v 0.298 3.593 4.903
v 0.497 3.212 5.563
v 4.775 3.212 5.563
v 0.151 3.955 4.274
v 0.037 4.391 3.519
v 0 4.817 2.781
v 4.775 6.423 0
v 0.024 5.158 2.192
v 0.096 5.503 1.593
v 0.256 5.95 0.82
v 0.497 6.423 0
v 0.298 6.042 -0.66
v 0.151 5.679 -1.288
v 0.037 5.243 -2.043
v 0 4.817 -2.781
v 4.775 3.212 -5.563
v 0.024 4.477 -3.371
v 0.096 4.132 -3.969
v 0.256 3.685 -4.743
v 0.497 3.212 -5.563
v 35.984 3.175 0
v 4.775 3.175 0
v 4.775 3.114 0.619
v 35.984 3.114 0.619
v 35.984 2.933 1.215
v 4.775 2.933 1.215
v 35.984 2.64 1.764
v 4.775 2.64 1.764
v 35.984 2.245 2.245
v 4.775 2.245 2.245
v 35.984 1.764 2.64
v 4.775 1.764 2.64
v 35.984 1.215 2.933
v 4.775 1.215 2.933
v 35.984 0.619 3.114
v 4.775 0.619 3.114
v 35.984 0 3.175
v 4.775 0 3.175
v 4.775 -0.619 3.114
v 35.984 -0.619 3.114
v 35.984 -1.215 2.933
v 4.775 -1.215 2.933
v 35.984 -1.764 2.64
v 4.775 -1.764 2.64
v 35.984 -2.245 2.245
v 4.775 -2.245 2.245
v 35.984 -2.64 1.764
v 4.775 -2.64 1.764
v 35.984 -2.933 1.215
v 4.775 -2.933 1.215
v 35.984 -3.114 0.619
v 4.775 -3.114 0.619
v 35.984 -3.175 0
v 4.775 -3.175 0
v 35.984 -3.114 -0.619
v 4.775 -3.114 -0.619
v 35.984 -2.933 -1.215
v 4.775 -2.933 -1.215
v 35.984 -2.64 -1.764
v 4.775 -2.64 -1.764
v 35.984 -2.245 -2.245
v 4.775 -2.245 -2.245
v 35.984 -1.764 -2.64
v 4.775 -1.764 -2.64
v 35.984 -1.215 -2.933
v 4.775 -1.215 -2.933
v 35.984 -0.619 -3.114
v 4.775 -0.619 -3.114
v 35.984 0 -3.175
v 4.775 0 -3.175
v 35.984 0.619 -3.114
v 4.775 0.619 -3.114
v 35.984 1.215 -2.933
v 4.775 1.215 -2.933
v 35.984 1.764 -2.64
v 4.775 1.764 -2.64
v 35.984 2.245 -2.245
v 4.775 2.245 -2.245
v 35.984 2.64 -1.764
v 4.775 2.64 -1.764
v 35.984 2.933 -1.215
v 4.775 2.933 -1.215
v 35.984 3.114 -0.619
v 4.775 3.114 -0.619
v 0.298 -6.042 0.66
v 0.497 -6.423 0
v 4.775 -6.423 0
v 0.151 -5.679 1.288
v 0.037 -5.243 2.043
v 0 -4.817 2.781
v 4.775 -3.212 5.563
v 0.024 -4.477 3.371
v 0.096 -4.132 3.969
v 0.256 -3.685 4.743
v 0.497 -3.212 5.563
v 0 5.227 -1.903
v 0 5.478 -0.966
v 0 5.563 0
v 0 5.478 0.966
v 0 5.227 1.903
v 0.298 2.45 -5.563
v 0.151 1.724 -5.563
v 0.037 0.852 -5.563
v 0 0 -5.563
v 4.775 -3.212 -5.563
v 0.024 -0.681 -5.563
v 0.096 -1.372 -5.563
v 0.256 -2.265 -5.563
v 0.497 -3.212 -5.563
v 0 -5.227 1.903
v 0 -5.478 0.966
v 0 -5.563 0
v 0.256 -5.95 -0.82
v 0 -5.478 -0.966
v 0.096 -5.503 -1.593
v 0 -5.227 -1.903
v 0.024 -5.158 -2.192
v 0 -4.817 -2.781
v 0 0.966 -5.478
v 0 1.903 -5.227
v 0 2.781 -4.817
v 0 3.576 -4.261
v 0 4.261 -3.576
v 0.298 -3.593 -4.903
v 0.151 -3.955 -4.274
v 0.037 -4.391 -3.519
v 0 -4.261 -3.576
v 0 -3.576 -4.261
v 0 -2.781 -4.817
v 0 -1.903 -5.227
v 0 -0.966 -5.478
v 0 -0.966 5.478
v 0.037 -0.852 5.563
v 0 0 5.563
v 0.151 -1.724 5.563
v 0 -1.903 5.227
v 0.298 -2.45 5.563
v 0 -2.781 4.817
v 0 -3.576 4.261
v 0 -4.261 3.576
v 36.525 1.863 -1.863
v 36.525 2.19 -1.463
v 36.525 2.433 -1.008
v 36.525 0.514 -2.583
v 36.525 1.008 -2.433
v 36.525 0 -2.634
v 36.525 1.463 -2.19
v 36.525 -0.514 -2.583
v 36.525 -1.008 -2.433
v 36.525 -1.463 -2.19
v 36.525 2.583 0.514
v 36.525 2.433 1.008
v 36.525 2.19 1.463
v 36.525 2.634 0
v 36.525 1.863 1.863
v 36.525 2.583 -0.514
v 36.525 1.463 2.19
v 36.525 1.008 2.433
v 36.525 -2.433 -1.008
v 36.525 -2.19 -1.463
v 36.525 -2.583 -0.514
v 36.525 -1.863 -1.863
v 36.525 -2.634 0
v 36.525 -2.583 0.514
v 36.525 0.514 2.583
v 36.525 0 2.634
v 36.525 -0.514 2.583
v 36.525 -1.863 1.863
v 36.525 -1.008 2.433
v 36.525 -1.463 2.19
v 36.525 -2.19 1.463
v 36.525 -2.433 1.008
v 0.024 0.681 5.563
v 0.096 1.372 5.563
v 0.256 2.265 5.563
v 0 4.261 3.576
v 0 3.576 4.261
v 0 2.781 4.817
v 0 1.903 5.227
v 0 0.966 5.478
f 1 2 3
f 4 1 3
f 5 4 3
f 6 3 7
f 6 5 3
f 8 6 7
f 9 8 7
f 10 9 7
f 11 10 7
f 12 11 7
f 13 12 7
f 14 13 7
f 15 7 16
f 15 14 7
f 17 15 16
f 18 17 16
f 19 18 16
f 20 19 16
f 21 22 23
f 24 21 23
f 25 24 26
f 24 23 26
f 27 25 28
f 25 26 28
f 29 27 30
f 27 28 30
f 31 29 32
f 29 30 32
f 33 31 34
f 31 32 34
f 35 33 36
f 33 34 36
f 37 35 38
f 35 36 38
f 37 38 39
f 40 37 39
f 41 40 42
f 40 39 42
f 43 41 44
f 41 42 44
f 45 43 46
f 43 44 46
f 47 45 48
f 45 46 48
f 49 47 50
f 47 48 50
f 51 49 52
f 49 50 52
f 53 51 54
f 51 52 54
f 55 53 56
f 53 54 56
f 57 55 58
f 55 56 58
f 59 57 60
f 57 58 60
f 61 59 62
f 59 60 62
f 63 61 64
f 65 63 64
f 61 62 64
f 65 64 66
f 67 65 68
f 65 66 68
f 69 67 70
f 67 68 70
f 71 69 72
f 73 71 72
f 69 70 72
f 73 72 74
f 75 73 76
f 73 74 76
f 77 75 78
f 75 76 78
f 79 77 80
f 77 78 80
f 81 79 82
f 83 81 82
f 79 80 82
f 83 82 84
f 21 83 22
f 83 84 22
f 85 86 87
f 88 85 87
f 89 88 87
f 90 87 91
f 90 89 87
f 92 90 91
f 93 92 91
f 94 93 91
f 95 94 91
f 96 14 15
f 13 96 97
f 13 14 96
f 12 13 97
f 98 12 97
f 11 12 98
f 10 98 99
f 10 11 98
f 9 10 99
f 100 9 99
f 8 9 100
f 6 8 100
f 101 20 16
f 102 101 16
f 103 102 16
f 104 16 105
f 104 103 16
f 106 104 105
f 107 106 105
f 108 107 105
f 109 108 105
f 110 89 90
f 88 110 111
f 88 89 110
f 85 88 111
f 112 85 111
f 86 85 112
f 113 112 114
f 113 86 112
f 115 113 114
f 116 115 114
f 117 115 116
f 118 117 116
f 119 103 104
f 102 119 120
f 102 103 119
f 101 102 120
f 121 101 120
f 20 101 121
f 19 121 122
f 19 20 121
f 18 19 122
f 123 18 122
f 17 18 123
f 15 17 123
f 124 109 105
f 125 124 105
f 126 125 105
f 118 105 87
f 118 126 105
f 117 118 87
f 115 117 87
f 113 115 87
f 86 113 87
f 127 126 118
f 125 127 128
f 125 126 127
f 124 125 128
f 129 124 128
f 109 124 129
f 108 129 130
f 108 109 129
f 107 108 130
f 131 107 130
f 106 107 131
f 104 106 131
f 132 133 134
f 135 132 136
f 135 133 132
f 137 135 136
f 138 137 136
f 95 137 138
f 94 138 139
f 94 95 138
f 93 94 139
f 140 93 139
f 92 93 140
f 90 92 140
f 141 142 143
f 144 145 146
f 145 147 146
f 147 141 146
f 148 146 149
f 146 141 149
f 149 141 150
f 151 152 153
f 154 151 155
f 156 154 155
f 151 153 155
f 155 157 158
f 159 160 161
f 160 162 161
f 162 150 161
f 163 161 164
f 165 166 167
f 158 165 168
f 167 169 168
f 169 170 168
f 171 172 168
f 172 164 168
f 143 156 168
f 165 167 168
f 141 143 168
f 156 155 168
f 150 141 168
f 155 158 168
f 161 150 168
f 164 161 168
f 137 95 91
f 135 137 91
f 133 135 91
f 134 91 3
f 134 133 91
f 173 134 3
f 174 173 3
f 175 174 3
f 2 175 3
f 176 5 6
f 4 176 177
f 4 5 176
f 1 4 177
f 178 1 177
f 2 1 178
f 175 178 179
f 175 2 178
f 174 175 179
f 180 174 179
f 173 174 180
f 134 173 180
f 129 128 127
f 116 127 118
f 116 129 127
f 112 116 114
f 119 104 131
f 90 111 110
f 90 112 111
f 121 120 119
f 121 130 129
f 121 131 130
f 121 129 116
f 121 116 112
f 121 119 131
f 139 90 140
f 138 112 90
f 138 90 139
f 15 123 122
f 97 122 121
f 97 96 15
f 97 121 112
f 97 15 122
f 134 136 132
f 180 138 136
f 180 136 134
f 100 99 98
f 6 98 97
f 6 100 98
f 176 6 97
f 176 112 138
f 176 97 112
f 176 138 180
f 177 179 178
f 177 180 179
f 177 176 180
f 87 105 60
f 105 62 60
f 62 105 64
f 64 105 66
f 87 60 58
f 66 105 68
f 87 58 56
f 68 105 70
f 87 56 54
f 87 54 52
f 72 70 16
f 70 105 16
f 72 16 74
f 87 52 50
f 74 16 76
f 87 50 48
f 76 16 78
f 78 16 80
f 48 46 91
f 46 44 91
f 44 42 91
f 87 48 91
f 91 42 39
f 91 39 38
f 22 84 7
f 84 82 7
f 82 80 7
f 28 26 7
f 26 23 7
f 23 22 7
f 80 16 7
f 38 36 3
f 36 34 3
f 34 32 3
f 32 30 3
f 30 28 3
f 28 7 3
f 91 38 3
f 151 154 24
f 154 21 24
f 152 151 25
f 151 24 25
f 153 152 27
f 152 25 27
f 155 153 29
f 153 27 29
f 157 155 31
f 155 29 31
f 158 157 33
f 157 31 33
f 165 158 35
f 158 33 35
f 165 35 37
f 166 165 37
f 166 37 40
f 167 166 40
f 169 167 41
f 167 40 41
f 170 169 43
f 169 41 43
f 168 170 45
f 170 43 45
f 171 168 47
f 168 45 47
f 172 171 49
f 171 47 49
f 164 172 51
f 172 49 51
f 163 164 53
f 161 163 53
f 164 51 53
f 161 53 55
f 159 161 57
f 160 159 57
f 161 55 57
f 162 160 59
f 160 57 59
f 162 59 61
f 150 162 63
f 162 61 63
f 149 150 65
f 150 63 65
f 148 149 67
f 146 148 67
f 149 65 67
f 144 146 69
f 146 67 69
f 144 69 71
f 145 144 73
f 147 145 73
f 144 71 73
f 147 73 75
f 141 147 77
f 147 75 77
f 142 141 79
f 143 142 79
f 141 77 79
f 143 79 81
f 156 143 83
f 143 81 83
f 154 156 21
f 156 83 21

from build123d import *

# Parameters (mm, degrees)
BASEHEAD_DEPTH = 4.7752


with BuildPart() as part:
    # Sketch1 → BaseHead (new body)
    with BuildSketch(Plane(origin=(0, 0, 0), x_dir=(0, 0, -1), z_dir=(1, 0, 0))):
        Polygon((5.5626, 3.211568607), (5.5626, -3.211568607), (0, -6.423137215), (-5.5626, -3.211568607), (-5.5626, 3.211568607), (0, 6.423137215), align=None)
    extrude(amount=BASEHEAD_DEPTH)

    # BodySke → BaseBody (revolve)
    with BuildSketch(Plane.XY):
        Polygon((0, 0), (36.5252, 0), (36.5252, 2.63398), (35.98418, 3.175), (0, 3.175), align=None)
    revolve(axis=Axis((0, 0, 0), (1, 0, 0)))

    # Sketch3 → HeadChamfer (revolve, cut)
    with BuildSketch(Plane.XY):
        Polygon((0, 5.5626), (4.163005602, 12.773137215), (4.163005602, 19.123137215), (-12.7, 19.123137215), (-12.7, 5.5626), align=None)
    revolve(axis=Axis((0, 0, 0), (1, 0, 0)), mode=Mode.SUBTRACT)


solid = part.part
